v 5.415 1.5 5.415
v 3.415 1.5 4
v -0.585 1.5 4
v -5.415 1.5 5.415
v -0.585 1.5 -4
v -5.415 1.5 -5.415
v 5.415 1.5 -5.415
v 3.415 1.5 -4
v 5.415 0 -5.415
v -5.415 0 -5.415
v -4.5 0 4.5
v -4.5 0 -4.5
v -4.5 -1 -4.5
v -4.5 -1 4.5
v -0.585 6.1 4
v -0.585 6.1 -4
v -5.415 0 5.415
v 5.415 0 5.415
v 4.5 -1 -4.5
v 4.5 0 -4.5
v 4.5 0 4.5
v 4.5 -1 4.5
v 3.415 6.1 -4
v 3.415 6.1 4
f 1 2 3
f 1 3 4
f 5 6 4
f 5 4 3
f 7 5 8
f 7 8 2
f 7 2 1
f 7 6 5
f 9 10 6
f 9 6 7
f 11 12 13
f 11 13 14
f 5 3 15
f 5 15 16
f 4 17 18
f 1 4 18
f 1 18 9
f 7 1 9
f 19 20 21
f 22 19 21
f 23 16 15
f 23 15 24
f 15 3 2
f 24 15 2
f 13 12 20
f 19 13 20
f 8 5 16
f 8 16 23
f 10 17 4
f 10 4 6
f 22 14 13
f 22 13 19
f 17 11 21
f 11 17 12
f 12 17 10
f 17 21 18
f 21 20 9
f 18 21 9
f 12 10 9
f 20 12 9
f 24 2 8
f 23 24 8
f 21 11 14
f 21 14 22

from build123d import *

# Parameters (mm, degrees)
SKETCH1_W      = 10.83
SKETCH1_H      = 10.83
EXTRUDE1_DEPTH = 1.5
SKETCH2_W      = 9
SKETCH2_H      = 9
EXTRUDE2_DEPTH = 1
SKETCH3_W      = 4
SKETCH3_H      = 8
EXTRUDE3_DEPTH = 4.6


with BuildPart() as part:
    # Sketch1 → Extrude1 (new body)
    with BuildSketch(Plane(origin=(0, 0, 0), x_dir=(1, 0, 0), z_dir=(0, 1, 0))):
        Rectangle(SKETCH1_W, SKETCH1_H)
    extrude(amount=EXTRUDE1_DEPTH)

    # Sketch2 → Extrude2 (add)
    with BuildSketch(Plane.XZ):
        Rectangle(SKETCH2_W, SKETCH2_H)
    extrude(amount=EXTRUDE2_DEPTH)

    # Sketch3 → Extrude3 (add)
    with BuildSketch(Plane(origin=(0, 1.5, 0), x_dir=(1, 0, 0), z_dir=(0, 1, 0))):
        with Locations((1.415, 0)):
            Rectangle(SKETCH3_W, SKETCH3_H)
    extrude(amount=EXTRUDE3_DEPTH)


solid = part.part
